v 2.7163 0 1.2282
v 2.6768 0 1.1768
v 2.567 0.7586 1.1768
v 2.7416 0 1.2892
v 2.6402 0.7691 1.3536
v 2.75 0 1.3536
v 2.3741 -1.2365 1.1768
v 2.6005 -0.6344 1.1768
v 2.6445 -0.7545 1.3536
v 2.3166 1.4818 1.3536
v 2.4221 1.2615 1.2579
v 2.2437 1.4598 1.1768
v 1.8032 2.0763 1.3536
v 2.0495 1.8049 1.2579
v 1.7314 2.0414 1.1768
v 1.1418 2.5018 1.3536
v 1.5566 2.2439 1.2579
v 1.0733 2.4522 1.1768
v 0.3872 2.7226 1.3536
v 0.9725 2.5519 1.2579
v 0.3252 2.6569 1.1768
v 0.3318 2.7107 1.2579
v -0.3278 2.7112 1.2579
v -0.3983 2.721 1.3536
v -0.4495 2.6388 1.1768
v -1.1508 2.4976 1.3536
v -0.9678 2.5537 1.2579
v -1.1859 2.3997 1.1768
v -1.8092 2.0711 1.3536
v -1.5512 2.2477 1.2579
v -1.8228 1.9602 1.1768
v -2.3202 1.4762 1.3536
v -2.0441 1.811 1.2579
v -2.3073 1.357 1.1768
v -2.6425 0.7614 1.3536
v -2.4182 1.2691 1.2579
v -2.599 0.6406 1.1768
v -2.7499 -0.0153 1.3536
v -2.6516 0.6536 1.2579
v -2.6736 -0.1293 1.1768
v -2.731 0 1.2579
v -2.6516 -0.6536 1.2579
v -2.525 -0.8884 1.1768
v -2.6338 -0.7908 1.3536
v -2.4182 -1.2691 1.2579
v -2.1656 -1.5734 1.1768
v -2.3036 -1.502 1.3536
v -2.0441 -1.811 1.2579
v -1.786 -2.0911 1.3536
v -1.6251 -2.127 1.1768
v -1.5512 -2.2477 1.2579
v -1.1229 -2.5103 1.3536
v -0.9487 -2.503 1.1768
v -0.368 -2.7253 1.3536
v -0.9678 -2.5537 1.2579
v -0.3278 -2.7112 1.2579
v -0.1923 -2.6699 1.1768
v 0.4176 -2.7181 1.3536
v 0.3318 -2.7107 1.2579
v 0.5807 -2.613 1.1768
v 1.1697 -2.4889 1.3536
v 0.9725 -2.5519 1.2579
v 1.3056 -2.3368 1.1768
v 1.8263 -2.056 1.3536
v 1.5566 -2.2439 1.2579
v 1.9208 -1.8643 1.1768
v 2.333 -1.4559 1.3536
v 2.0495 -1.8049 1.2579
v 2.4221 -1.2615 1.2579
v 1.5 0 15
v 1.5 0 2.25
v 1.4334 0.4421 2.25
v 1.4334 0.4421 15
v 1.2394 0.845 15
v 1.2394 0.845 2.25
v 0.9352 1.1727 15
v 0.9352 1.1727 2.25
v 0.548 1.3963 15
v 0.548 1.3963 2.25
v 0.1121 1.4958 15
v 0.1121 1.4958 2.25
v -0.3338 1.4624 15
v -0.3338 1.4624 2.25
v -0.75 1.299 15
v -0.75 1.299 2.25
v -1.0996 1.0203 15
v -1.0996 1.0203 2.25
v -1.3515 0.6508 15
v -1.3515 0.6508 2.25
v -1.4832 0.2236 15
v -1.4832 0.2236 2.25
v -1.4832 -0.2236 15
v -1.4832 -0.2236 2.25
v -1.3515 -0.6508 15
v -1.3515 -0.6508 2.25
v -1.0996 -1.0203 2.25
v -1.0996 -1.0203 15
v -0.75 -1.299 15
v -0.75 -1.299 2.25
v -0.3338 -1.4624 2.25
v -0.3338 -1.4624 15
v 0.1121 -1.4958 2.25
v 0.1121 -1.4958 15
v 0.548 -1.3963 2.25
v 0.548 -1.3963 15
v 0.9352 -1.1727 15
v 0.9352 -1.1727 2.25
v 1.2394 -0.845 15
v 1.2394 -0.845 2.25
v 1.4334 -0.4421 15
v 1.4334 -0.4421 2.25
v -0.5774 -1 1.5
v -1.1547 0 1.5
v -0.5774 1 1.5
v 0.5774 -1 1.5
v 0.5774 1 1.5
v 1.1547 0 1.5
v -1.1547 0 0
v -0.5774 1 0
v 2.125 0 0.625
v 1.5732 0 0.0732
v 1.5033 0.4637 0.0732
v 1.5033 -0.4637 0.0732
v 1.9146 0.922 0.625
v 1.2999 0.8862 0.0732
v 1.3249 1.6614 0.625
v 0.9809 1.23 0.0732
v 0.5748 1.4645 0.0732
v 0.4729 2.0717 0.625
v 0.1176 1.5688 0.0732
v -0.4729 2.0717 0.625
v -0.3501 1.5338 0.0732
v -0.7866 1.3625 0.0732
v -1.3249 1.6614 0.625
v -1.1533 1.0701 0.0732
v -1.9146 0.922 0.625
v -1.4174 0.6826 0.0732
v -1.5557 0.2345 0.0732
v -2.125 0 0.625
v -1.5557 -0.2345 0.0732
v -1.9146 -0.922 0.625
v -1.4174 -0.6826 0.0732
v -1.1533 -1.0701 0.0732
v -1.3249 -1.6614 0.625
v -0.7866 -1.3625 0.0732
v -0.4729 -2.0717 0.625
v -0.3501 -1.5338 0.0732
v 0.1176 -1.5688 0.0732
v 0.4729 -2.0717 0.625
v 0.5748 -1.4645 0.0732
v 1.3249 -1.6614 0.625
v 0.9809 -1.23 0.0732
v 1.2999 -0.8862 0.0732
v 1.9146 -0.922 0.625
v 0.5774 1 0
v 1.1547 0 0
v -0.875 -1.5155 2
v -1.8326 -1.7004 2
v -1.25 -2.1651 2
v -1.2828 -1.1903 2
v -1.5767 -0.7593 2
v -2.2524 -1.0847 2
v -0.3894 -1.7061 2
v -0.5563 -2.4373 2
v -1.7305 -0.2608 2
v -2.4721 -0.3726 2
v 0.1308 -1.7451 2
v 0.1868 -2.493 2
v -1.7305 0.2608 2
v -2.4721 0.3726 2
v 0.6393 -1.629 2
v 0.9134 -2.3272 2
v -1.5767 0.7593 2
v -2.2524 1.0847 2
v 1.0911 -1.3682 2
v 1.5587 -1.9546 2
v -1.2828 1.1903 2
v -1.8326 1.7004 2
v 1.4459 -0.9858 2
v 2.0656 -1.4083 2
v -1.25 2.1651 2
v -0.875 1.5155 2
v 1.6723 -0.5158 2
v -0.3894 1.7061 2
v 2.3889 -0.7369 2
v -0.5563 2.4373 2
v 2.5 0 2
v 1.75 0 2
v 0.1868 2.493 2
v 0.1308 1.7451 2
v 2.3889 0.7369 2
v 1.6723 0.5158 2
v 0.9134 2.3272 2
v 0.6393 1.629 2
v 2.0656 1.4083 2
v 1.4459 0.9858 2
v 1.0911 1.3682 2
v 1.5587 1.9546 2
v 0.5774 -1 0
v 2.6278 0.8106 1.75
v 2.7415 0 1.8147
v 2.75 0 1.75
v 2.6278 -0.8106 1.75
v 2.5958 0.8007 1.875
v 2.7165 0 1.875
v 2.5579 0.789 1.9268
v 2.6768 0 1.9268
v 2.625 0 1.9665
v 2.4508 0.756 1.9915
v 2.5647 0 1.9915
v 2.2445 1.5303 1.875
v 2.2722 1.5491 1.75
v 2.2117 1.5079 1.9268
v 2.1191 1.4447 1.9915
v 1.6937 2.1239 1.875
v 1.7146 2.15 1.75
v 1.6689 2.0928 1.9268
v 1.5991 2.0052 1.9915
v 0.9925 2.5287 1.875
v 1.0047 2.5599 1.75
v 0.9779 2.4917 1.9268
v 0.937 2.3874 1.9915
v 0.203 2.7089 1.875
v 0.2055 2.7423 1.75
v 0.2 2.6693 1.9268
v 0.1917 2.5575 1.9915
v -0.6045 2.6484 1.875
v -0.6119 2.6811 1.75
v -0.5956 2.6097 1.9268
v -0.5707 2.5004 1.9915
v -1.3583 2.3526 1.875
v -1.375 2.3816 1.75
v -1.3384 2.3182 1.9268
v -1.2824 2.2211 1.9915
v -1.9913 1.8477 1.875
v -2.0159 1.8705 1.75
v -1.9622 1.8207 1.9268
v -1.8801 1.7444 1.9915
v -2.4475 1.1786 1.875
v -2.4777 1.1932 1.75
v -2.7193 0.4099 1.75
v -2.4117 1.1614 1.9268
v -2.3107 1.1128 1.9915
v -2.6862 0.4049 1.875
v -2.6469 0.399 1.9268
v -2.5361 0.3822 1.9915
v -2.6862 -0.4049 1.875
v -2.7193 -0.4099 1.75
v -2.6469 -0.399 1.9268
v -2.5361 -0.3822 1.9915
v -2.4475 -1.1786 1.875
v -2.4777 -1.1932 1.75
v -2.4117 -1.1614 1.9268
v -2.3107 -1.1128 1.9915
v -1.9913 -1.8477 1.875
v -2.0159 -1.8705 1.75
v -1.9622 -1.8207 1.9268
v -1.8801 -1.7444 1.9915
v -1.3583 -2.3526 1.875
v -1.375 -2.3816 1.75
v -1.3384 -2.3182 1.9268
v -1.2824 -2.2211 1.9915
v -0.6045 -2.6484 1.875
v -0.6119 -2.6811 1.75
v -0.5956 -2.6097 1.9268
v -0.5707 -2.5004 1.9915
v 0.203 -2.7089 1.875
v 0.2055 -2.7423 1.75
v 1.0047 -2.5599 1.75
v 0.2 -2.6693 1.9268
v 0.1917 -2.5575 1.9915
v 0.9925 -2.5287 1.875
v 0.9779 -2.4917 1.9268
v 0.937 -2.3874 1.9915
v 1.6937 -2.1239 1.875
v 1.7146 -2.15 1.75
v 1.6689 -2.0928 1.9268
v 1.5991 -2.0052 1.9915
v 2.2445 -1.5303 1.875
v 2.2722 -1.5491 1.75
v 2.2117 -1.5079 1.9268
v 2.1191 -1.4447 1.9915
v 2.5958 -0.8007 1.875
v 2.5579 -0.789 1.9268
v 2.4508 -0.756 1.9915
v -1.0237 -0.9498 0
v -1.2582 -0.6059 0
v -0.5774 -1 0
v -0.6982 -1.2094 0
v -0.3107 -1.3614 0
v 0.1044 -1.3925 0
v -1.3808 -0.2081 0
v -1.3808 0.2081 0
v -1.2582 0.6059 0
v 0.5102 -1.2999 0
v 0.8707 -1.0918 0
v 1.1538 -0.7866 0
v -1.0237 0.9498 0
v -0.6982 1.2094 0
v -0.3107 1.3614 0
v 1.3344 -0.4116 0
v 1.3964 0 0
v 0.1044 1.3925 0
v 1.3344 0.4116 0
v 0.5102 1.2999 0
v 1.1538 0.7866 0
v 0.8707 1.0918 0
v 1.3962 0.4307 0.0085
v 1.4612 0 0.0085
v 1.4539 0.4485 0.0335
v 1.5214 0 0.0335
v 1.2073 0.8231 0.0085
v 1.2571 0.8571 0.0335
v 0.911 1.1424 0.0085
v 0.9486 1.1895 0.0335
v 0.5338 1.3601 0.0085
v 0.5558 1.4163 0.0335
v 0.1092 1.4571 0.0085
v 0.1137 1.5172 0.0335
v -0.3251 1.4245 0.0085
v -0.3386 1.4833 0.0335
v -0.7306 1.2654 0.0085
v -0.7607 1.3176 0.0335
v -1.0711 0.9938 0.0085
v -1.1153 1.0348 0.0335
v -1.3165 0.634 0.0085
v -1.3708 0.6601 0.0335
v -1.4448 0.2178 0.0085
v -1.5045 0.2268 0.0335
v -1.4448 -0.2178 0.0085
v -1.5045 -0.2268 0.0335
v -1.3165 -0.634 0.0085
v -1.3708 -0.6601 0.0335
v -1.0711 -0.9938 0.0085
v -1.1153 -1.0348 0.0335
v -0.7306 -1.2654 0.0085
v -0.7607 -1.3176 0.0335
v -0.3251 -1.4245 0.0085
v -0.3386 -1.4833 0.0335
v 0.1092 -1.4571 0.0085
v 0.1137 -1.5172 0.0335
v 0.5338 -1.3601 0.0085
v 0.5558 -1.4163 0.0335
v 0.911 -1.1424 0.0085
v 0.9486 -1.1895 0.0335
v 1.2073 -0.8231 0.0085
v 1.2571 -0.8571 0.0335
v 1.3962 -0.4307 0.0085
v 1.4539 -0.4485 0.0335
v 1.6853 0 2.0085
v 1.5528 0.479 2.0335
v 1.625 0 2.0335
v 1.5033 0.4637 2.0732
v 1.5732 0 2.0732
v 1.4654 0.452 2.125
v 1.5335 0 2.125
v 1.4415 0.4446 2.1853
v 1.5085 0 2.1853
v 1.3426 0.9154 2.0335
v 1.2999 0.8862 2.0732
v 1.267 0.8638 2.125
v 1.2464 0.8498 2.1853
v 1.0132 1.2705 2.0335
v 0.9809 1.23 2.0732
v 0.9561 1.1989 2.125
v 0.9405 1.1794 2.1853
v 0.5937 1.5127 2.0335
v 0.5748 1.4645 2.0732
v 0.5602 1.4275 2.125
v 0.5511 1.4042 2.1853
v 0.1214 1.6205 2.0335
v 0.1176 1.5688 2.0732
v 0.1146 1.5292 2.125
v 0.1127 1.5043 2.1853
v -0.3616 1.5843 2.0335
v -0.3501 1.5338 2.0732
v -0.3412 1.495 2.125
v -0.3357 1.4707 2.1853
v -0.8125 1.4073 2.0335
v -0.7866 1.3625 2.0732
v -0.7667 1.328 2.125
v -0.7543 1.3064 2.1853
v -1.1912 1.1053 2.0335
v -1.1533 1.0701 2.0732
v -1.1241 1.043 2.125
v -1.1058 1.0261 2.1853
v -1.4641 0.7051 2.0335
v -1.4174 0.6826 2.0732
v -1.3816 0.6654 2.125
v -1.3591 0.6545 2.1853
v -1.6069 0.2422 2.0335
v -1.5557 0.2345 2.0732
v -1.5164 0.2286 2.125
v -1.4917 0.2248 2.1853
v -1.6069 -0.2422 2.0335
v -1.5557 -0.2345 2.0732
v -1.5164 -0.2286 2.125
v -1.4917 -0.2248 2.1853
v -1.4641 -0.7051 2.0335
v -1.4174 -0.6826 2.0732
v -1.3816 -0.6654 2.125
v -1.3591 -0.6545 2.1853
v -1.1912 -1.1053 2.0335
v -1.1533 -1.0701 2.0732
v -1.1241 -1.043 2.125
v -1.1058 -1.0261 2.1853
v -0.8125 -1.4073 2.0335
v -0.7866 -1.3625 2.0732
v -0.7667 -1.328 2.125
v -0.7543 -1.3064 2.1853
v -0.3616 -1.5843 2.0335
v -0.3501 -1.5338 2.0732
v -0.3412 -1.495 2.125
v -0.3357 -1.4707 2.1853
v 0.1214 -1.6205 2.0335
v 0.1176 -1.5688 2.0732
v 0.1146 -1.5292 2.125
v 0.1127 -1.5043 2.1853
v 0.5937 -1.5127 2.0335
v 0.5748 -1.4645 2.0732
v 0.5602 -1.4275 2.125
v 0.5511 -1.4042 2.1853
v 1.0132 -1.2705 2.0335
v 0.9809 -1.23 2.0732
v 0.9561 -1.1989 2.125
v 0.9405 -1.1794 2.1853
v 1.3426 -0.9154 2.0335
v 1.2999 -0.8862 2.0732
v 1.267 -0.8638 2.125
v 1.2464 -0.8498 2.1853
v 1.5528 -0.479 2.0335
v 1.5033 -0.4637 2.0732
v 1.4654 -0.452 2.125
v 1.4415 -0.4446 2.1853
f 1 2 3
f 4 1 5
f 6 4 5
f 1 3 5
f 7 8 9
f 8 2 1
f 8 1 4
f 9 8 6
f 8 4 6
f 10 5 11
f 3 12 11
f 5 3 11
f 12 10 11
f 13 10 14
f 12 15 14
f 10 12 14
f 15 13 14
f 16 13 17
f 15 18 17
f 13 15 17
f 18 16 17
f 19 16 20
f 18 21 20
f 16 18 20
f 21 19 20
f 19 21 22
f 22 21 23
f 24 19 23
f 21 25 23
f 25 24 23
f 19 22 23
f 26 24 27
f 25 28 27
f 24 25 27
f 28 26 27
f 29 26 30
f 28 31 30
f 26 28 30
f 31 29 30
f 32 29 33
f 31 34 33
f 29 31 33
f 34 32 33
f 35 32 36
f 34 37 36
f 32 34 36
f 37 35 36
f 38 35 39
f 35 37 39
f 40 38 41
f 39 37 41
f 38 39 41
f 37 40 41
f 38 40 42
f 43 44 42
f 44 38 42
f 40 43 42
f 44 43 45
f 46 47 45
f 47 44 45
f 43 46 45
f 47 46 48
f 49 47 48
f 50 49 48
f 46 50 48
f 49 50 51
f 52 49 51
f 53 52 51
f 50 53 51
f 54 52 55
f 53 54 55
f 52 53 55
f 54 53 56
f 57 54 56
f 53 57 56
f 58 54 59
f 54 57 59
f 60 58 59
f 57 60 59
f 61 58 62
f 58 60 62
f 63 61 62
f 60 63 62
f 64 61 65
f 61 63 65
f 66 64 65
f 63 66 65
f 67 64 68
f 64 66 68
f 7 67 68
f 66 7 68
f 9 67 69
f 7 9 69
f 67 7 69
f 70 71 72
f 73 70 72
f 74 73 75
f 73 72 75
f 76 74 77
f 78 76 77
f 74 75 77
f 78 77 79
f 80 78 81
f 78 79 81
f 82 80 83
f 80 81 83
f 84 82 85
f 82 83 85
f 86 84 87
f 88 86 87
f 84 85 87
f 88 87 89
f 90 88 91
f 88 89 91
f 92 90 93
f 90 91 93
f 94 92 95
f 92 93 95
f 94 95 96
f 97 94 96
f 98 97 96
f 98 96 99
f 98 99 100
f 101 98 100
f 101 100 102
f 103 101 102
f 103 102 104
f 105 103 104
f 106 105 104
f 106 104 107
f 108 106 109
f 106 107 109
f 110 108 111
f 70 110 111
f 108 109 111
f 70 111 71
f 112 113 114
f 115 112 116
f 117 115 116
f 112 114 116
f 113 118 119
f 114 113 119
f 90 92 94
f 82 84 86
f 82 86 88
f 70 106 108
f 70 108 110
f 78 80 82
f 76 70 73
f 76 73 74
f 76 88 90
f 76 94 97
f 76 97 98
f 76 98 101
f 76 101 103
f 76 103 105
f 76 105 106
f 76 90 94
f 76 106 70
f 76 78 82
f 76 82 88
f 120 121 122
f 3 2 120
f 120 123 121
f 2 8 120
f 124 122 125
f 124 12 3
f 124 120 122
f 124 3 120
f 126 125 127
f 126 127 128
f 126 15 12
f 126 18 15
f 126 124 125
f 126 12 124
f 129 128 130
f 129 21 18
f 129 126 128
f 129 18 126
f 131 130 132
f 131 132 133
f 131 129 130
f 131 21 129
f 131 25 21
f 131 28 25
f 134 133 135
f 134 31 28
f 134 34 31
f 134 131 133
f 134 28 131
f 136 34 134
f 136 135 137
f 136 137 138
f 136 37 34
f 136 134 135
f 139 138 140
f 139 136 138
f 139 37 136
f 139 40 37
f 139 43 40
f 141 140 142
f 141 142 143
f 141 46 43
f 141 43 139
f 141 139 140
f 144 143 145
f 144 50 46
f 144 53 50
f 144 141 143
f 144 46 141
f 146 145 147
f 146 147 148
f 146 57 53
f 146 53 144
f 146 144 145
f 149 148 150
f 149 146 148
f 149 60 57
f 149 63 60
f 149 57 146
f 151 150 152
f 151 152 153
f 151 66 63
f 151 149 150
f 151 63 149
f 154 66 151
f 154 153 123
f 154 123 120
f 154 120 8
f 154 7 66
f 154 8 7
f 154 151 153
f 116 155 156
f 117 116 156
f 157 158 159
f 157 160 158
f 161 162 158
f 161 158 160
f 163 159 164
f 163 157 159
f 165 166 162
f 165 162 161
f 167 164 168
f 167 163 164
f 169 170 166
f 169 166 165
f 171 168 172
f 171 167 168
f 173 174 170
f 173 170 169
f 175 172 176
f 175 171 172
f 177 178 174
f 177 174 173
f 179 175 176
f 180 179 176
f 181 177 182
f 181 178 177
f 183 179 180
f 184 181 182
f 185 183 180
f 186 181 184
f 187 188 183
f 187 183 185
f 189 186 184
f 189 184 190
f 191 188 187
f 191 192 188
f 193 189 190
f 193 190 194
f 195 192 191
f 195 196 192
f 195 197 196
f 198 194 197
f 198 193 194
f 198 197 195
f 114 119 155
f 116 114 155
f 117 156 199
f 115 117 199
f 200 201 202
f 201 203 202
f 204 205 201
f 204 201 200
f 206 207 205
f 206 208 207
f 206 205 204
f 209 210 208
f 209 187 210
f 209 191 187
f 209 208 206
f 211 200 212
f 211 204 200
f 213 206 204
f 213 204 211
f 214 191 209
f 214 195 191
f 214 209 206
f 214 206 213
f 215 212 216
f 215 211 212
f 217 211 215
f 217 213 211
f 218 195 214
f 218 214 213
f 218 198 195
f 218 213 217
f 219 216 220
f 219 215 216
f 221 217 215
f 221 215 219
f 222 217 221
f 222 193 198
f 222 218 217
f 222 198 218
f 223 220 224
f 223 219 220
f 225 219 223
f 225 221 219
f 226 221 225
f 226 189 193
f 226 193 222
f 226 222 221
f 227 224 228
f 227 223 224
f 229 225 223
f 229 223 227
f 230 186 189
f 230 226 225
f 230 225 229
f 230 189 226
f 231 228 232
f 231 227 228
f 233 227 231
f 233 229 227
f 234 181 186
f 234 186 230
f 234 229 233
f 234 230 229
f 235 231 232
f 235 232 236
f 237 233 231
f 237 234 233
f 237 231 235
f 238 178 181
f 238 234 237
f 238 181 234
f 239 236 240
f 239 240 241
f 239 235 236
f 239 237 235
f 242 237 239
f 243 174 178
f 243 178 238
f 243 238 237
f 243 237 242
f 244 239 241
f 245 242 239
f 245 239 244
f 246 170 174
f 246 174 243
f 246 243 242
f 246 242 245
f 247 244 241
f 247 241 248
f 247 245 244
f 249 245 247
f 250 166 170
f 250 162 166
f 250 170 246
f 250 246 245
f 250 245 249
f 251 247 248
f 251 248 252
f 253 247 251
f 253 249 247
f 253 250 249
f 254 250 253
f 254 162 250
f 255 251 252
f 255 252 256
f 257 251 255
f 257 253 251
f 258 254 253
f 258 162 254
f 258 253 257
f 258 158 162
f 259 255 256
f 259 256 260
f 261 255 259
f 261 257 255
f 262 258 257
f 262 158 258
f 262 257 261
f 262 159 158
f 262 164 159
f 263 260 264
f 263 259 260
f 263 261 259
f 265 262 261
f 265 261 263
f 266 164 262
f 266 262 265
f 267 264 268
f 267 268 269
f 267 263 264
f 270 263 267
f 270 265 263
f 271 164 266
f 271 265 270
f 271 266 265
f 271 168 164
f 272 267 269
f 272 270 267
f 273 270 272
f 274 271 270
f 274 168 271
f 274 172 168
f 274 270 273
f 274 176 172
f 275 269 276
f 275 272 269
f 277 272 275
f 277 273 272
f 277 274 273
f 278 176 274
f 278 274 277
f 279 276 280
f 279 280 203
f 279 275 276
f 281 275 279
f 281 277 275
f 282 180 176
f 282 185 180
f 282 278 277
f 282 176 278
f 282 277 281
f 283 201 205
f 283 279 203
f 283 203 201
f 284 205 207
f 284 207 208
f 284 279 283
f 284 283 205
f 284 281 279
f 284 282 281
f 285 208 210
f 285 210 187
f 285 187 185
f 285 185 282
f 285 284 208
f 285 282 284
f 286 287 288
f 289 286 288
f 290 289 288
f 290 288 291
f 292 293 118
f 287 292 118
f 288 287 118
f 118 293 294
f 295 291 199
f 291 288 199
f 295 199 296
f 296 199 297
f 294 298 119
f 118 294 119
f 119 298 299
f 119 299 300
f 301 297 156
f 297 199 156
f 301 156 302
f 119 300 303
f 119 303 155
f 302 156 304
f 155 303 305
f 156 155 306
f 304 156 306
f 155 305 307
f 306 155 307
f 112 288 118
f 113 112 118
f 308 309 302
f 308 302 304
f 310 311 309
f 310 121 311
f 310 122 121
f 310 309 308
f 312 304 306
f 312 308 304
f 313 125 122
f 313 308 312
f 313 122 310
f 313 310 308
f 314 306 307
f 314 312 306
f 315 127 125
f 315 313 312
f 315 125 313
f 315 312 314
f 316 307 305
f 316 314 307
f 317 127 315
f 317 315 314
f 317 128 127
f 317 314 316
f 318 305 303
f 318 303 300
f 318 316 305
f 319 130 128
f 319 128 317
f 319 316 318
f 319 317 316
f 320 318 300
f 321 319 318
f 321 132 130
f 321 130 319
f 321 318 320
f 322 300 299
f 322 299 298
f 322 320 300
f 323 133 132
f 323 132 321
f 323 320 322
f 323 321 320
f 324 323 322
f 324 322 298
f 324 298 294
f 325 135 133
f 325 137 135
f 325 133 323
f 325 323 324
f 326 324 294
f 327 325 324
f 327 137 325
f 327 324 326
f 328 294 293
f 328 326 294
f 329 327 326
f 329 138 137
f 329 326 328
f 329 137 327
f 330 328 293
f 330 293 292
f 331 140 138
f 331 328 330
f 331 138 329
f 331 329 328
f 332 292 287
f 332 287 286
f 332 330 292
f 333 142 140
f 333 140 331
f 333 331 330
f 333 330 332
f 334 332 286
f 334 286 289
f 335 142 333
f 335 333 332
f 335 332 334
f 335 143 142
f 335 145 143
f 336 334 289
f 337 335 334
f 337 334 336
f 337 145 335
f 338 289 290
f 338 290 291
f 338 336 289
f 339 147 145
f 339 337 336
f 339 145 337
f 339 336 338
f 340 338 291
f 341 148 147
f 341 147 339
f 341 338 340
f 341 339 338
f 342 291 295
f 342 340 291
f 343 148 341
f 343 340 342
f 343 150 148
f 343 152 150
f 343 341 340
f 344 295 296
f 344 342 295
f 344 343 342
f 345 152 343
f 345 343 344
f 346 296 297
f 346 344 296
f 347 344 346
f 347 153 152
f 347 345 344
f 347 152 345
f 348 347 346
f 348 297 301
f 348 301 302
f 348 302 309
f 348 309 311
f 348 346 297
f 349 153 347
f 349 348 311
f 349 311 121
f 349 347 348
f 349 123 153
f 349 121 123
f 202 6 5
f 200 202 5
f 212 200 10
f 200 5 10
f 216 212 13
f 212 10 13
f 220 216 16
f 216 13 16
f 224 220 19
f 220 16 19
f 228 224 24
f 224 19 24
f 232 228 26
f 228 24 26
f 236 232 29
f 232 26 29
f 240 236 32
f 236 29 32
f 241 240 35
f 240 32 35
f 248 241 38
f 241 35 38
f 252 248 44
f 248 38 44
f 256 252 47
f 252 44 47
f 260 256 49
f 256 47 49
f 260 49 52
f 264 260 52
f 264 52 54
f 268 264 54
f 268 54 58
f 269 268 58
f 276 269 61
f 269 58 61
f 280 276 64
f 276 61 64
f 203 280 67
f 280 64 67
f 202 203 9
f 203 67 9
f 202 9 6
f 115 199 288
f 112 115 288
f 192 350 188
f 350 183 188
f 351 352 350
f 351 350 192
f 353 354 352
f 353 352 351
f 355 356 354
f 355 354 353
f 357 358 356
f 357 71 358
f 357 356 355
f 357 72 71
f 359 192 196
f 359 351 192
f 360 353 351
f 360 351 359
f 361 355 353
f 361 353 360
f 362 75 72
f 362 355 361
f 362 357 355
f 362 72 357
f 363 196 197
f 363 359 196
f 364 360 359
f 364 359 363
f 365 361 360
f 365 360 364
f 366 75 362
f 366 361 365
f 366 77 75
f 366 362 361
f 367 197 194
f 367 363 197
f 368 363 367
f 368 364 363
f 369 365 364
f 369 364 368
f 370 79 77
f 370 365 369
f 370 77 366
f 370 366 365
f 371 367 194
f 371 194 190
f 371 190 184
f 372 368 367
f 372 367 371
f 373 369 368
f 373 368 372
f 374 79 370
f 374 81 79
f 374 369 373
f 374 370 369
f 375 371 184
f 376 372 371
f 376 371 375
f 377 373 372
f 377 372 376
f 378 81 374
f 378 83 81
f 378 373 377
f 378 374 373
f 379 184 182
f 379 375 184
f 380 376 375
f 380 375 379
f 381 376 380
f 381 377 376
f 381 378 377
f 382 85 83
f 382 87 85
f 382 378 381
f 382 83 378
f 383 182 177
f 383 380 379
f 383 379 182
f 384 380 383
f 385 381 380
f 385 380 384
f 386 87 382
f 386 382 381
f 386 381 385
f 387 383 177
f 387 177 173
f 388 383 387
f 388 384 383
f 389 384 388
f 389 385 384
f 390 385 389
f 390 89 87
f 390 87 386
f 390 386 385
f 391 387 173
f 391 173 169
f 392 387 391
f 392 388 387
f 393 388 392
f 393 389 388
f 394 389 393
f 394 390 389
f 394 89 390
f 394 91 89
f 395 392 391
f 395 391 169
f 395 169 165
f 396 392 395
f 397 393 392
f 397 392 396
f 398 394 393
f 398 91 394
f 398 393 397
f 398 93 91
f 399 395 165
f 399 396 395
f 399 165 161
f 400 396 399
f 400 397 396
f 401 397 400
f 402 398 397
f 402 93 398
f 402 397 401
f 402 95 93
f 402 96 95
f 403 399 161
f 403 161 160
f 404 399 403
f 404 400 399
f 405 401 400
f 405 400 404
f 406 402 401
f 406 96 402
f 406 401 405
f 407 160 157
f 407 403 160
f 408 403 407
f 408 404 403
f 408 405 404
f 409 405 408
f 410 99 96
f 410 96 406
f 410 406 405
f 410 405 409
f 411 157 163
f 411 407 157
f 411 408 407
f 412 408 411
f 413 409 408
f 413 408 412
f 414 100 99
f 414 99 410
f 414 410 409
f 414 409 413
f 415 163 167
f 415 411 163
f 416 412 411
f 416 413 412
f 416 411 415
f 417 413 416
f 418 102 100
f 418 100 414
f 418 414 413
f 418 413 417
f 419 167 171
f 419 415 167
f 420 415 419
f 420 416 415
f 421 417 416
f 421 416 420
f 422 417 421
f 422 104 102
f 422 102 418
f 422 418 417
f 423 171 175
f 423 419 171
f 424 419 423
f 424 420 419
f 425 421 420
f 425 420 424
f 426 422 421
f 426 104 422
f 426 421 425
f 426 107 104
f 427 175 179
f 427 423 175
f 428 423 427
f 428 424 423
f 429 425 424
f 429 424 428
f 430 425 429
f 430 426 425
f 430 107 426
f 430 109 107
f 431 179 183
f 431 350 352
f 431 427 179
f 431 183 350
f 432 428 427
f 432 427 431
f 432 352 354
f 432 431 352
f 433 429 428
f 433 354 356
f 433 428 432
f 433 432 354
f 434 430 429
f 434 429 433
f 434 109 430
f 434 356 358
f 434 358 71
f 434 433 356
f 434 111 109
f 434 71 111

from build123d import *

# Parameters (mm, degrees)
F1_R     = 2.75
F1_R_2   = 1.5
F2_DEPTH = 2
F3_START = 1.5
F3_DEPTH = 0.5
F4_START = 2
F4_DEPTH = 13
F5_SIZE2 = 1.25
F5_SIZE  = 1.25
F6_R     = 0.25


# Not quite as in the source:
# - a feature names something its author has since deleted; it is built from what else it names


with BuildPart() as f2:
    # F1 (on Top) → F2 (new body)
    with BuildSketch(Plane.XY):
        Circle(F1_R)
        Circle(F1_R_2, mode=Mode.SUBTRACT)
        Circle(F1_R_2)
        Polygon((-0.5773502692, -1), (-1.1547005384, 0), (-0.5773502692, 1), (0.5773502692, 1), (1.1547005384, 0), (0.5773502692, -1), align=None, mode=Mode.SUBTRACT)
    extrude(amount=F2_DEPTH)

    # F1 (on Top) → F3 (join)
    with BuildSketch(Plane.XY.offset(F3_START)):
        Polygon((-0.5773502692, 1), (-1.1547005384, 0), (-0.5773502692, -1), (0.5773502692, -1), (1.1547005384, 0), (0.5773502692, 1), align=None)
    extrude(amount=F3_DEPTH)

    # F1 (on Top) → F4 (join)
    with BuildSketch(Plane.XY.offset(F4_START)):
        Circle(F1_R_2)
        Polygon((-0.5773502692, -1), (-1.1547005384, 0), (-0.5773502692, 1), (0.5773502692, 1), (1.1547005384, 0), (0.5773502692, -1), align=None, mode=Mode.SUBTRACT)
        Polygon((-0.5773502692, 1), (-1.1547005384, 0), (-0.5773502692, -1), (0.5773502692, -1), (1.1547005384, 0), (0.5773502692, 1), align=None)
    extrude(amount=F4_DEPTH)

    # F5
    f5_edges = [f2.edges().sort_by_distance(p)[0] for p in [
        (-2.75, 0, 0),
    ]]
    chamfer(f5_edges, length=F5_SIZE, length2=F5_SIZE2)

    # F6
    f6_edges = [f2.edges().sort_by_distance(p)[0] for p in [
        (-2.75, 0, 2),
        (-1.5, 0, 2),
        (-1.5, 0, 0),
        (-2.75, 0, 1.25),
    ]]
    fillet(f6_edges, radius=F6_R)


solid = f2.part
